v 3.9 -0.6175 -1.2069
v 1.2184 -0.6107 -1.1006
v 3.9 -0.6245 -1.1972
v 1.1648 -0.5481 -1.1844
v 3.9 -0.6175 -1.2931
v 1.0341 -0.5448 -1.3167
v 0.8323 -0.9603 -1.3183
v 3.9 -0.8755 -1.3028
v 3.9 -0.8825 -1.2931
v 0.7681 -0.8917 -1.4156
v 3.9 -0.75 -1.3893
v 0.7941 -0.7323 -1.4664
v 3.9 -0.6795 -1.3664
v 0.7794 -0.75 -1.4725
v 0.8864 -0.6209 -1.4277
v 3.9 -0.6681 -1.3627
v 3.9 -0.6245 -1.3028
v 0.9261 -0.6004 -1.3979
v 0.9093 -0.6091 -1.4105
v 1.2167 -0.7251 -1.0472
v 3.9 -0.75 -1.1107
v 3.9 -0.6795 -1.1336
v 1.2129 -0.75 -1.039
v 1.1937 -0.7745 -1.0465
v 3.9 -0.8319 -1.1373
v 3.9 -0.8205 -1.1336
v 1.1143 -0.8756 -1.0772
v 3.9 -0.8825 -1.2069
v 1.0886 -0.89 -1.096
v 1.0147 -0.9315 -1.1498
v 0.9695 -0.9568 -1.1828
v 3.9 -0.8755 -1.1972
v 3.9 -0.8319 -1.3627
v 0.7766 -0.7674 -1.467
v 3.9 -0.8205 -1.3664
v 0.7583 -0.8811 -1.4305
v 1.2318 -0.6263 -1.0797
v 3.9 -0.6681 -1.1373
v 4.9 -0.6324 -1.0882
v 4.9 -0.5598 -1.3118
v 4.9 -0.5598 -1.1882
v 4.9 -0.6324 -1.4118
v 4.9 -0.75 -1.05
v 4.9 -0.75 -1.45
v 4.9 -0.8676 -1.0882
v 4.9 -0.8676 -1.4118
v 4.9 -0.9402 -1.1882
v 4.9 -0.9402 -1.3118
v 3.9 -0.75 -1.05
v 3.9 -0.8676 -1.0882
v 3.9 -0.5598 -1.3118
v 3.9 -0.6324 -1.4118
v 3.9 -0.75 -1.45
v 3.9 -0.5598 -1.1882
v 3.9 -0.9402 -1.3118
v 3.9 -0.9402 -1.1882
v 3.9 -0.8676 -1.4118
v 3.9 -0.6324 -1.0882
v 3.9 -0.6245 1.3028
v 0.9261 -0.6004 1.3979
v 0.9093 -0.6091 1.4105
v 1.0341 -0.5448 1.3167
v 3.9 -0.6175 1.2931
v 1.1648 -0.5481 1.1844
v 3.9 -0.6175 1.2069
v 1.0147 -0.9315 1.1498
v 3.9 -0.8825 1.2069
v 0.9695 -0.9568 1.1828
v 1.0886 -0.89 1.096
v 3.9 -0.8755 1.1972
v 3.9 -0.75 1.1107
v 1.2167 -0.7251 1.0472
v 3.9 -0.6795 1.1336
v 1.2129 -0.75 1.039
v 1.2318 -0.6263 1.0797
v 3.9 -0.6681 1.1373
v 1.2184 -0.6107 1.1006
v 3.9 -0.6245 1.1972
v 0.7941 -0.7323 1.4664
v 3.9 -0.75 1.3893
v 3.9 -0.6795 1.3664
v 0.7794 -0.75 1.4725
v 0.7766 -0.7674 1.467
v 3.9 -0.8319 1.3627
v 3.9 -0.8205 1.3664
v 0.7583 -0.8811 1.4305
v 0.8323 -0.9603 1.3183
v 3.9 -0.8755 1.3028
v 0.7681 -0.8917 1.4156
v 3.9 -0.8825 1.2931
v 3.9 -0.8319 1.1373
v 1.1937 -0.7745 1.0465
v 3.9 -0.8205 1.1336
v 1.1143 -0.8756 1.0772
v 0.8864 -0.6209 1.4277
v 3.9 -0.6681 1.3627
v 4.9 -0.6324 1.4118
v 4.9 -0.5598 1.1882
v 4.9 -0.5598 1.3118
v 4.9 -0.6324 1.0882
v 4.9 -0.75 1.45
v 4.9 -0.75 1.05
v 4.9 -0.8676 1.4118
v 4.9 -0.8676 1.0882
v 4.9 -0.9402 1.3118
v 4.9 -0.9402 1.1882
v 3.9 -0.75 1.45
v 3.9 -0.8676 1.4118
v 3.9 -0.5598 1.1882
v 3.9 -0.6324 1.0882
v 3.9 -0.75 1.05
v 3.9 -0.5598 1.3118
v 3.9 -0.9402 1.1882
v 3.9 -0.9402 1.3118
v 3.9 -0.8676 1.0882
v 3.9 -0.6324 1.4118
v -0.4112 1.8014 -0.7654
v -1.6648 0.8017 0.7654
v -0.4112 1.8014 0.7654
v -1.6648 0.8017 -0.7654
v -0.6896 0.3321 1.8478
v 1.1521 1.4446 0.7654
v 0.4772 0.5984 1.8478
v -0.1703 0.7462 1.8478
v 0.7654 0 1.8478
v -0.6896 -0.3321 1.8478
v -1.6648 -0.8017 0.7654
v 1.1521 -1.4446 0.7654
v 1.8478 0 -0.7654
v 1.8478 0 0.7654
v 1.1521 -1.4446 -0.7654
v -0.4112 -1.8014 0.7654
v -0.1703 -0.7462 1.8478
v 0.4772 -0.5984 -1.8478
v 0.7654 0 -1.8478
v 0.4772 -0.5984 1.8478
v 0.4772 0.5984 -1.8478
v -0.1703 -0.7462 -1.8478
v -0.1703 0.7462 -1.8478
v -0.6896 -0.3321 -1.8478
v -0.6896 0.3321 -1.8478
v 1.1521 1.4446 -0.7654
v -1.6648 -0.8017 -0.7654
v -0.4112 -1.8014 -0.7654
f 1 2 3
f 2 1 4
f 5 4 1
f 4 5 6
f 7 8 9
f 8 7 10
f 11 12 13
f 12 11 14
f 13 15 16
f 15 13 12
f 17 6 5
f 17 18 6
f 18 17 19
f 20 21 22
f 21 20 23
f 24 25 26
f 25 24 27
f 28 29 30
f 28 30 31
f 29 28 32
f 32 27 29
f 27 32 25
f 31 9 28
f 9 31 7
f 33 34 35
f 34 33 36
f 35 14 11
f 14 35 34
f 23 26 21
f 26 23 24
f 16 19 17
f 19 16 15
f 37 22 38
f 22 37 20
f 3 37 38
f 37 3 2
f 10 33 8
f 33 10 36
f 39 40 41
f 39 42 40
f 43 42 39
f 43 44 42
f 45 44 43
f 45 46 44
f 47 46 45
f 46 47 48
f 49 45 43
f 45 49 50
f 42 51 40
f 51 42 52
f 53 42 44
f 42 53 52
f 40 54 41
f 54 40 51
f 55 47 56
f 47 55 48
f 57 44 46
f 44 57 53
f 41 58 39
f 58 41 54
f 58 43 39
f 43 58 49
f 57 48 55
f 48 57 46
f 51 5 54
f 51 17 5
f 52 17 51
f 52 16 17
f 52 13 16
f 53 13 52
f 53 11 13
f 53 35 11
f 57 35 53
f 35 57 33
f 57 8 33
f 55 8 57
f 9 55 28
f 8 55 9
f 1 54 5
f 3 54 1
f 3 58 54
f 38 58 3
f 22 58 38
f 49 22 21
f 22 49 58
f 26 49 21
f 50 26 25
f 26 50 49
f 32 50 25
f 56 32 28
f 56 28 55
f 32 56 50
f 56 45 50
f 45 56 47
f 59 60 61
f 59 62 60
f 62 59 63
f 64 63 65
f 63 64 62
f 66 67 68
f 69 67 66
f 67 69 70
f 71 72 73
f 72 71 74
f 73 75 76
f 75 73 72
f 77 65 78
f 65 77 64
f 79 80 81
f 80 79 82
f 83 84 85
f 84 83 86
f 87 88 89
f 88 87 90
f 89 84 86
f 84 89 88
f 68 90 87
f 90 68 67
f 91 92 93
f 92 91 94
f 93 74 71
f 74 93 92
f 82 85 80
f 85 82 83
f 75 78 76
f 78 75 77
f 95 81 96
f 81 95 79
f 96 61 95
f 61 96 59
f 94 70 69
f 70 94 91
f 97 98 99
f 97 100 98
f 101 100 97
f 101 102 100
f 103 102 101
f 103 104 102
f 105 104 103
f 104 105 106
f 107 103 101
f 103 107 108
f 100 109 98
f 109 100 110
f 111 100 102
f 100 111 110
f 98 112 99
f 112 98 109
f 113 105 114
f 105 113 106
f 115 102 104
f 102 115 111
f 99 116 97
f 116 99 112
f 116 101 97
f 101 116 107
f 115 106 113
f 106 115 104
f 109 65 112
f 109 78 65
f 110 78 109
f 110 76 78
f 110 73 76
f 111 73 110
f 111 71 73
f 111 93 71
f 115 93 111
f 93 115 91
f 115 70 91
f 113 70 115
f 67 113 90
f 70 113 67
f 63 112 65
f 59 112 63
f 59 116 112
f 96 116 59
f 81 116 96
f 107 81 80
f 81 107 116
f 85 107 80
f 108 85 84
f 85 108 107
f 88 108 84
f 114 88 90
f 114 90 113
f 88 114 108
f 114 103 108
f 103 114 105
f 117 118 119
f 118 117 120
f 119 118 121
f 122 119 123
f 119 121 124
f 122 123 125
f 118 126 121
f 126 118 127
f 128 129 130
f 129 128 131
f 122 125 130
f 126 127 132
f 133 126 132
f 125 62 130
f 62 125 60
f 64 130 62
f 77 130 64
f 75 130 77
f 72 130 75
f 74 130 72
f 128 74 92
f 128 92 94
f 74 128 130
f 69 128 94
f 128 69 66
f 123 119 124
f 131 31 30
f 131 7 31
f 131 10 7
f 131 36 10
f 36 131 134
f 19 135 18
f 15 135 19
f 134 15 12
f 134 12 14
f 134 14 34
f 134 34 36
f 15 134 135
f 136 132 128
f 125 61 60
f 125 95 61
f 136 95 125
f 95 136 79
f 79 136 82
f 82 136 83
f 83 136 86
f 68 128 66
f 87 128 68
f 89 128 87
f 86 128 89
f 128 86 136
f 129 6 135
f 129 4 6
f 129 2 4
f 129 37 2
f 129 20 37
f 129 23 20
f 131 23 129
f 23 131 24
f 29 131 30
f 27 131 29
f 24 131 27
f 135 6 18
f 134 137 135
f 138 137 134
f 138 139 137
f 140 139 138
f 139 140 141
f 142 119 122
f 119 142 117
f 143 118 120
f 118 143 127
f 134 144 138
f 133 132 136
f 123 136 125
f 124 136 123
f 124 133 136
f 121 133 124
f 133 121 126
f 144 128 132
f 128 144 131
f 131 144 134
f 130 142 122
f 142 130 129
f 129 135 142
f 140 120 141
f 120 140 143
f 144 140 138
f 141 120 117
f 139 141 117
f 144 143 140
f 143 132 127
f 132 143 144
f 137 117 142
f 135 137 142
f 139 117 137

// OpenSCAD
module gunbarrel()
{
	cylinder(4.5,0.25,0.13,center=true,$fn=10);
	translate(v = [0, 0, 2.4]) 
		cylinder(1.0,0.20,0.20,center=true,$fn=10);
}

union() {
	sphere(2);
	translate([0,-0.75,0]) {
		translate([2,0,-1.25])
			rotate([0,90,0])
				gunbarrel();
		translate([2,0,1.25])
			rotate([0,90,0])
				gunbarrel();
	}
}
